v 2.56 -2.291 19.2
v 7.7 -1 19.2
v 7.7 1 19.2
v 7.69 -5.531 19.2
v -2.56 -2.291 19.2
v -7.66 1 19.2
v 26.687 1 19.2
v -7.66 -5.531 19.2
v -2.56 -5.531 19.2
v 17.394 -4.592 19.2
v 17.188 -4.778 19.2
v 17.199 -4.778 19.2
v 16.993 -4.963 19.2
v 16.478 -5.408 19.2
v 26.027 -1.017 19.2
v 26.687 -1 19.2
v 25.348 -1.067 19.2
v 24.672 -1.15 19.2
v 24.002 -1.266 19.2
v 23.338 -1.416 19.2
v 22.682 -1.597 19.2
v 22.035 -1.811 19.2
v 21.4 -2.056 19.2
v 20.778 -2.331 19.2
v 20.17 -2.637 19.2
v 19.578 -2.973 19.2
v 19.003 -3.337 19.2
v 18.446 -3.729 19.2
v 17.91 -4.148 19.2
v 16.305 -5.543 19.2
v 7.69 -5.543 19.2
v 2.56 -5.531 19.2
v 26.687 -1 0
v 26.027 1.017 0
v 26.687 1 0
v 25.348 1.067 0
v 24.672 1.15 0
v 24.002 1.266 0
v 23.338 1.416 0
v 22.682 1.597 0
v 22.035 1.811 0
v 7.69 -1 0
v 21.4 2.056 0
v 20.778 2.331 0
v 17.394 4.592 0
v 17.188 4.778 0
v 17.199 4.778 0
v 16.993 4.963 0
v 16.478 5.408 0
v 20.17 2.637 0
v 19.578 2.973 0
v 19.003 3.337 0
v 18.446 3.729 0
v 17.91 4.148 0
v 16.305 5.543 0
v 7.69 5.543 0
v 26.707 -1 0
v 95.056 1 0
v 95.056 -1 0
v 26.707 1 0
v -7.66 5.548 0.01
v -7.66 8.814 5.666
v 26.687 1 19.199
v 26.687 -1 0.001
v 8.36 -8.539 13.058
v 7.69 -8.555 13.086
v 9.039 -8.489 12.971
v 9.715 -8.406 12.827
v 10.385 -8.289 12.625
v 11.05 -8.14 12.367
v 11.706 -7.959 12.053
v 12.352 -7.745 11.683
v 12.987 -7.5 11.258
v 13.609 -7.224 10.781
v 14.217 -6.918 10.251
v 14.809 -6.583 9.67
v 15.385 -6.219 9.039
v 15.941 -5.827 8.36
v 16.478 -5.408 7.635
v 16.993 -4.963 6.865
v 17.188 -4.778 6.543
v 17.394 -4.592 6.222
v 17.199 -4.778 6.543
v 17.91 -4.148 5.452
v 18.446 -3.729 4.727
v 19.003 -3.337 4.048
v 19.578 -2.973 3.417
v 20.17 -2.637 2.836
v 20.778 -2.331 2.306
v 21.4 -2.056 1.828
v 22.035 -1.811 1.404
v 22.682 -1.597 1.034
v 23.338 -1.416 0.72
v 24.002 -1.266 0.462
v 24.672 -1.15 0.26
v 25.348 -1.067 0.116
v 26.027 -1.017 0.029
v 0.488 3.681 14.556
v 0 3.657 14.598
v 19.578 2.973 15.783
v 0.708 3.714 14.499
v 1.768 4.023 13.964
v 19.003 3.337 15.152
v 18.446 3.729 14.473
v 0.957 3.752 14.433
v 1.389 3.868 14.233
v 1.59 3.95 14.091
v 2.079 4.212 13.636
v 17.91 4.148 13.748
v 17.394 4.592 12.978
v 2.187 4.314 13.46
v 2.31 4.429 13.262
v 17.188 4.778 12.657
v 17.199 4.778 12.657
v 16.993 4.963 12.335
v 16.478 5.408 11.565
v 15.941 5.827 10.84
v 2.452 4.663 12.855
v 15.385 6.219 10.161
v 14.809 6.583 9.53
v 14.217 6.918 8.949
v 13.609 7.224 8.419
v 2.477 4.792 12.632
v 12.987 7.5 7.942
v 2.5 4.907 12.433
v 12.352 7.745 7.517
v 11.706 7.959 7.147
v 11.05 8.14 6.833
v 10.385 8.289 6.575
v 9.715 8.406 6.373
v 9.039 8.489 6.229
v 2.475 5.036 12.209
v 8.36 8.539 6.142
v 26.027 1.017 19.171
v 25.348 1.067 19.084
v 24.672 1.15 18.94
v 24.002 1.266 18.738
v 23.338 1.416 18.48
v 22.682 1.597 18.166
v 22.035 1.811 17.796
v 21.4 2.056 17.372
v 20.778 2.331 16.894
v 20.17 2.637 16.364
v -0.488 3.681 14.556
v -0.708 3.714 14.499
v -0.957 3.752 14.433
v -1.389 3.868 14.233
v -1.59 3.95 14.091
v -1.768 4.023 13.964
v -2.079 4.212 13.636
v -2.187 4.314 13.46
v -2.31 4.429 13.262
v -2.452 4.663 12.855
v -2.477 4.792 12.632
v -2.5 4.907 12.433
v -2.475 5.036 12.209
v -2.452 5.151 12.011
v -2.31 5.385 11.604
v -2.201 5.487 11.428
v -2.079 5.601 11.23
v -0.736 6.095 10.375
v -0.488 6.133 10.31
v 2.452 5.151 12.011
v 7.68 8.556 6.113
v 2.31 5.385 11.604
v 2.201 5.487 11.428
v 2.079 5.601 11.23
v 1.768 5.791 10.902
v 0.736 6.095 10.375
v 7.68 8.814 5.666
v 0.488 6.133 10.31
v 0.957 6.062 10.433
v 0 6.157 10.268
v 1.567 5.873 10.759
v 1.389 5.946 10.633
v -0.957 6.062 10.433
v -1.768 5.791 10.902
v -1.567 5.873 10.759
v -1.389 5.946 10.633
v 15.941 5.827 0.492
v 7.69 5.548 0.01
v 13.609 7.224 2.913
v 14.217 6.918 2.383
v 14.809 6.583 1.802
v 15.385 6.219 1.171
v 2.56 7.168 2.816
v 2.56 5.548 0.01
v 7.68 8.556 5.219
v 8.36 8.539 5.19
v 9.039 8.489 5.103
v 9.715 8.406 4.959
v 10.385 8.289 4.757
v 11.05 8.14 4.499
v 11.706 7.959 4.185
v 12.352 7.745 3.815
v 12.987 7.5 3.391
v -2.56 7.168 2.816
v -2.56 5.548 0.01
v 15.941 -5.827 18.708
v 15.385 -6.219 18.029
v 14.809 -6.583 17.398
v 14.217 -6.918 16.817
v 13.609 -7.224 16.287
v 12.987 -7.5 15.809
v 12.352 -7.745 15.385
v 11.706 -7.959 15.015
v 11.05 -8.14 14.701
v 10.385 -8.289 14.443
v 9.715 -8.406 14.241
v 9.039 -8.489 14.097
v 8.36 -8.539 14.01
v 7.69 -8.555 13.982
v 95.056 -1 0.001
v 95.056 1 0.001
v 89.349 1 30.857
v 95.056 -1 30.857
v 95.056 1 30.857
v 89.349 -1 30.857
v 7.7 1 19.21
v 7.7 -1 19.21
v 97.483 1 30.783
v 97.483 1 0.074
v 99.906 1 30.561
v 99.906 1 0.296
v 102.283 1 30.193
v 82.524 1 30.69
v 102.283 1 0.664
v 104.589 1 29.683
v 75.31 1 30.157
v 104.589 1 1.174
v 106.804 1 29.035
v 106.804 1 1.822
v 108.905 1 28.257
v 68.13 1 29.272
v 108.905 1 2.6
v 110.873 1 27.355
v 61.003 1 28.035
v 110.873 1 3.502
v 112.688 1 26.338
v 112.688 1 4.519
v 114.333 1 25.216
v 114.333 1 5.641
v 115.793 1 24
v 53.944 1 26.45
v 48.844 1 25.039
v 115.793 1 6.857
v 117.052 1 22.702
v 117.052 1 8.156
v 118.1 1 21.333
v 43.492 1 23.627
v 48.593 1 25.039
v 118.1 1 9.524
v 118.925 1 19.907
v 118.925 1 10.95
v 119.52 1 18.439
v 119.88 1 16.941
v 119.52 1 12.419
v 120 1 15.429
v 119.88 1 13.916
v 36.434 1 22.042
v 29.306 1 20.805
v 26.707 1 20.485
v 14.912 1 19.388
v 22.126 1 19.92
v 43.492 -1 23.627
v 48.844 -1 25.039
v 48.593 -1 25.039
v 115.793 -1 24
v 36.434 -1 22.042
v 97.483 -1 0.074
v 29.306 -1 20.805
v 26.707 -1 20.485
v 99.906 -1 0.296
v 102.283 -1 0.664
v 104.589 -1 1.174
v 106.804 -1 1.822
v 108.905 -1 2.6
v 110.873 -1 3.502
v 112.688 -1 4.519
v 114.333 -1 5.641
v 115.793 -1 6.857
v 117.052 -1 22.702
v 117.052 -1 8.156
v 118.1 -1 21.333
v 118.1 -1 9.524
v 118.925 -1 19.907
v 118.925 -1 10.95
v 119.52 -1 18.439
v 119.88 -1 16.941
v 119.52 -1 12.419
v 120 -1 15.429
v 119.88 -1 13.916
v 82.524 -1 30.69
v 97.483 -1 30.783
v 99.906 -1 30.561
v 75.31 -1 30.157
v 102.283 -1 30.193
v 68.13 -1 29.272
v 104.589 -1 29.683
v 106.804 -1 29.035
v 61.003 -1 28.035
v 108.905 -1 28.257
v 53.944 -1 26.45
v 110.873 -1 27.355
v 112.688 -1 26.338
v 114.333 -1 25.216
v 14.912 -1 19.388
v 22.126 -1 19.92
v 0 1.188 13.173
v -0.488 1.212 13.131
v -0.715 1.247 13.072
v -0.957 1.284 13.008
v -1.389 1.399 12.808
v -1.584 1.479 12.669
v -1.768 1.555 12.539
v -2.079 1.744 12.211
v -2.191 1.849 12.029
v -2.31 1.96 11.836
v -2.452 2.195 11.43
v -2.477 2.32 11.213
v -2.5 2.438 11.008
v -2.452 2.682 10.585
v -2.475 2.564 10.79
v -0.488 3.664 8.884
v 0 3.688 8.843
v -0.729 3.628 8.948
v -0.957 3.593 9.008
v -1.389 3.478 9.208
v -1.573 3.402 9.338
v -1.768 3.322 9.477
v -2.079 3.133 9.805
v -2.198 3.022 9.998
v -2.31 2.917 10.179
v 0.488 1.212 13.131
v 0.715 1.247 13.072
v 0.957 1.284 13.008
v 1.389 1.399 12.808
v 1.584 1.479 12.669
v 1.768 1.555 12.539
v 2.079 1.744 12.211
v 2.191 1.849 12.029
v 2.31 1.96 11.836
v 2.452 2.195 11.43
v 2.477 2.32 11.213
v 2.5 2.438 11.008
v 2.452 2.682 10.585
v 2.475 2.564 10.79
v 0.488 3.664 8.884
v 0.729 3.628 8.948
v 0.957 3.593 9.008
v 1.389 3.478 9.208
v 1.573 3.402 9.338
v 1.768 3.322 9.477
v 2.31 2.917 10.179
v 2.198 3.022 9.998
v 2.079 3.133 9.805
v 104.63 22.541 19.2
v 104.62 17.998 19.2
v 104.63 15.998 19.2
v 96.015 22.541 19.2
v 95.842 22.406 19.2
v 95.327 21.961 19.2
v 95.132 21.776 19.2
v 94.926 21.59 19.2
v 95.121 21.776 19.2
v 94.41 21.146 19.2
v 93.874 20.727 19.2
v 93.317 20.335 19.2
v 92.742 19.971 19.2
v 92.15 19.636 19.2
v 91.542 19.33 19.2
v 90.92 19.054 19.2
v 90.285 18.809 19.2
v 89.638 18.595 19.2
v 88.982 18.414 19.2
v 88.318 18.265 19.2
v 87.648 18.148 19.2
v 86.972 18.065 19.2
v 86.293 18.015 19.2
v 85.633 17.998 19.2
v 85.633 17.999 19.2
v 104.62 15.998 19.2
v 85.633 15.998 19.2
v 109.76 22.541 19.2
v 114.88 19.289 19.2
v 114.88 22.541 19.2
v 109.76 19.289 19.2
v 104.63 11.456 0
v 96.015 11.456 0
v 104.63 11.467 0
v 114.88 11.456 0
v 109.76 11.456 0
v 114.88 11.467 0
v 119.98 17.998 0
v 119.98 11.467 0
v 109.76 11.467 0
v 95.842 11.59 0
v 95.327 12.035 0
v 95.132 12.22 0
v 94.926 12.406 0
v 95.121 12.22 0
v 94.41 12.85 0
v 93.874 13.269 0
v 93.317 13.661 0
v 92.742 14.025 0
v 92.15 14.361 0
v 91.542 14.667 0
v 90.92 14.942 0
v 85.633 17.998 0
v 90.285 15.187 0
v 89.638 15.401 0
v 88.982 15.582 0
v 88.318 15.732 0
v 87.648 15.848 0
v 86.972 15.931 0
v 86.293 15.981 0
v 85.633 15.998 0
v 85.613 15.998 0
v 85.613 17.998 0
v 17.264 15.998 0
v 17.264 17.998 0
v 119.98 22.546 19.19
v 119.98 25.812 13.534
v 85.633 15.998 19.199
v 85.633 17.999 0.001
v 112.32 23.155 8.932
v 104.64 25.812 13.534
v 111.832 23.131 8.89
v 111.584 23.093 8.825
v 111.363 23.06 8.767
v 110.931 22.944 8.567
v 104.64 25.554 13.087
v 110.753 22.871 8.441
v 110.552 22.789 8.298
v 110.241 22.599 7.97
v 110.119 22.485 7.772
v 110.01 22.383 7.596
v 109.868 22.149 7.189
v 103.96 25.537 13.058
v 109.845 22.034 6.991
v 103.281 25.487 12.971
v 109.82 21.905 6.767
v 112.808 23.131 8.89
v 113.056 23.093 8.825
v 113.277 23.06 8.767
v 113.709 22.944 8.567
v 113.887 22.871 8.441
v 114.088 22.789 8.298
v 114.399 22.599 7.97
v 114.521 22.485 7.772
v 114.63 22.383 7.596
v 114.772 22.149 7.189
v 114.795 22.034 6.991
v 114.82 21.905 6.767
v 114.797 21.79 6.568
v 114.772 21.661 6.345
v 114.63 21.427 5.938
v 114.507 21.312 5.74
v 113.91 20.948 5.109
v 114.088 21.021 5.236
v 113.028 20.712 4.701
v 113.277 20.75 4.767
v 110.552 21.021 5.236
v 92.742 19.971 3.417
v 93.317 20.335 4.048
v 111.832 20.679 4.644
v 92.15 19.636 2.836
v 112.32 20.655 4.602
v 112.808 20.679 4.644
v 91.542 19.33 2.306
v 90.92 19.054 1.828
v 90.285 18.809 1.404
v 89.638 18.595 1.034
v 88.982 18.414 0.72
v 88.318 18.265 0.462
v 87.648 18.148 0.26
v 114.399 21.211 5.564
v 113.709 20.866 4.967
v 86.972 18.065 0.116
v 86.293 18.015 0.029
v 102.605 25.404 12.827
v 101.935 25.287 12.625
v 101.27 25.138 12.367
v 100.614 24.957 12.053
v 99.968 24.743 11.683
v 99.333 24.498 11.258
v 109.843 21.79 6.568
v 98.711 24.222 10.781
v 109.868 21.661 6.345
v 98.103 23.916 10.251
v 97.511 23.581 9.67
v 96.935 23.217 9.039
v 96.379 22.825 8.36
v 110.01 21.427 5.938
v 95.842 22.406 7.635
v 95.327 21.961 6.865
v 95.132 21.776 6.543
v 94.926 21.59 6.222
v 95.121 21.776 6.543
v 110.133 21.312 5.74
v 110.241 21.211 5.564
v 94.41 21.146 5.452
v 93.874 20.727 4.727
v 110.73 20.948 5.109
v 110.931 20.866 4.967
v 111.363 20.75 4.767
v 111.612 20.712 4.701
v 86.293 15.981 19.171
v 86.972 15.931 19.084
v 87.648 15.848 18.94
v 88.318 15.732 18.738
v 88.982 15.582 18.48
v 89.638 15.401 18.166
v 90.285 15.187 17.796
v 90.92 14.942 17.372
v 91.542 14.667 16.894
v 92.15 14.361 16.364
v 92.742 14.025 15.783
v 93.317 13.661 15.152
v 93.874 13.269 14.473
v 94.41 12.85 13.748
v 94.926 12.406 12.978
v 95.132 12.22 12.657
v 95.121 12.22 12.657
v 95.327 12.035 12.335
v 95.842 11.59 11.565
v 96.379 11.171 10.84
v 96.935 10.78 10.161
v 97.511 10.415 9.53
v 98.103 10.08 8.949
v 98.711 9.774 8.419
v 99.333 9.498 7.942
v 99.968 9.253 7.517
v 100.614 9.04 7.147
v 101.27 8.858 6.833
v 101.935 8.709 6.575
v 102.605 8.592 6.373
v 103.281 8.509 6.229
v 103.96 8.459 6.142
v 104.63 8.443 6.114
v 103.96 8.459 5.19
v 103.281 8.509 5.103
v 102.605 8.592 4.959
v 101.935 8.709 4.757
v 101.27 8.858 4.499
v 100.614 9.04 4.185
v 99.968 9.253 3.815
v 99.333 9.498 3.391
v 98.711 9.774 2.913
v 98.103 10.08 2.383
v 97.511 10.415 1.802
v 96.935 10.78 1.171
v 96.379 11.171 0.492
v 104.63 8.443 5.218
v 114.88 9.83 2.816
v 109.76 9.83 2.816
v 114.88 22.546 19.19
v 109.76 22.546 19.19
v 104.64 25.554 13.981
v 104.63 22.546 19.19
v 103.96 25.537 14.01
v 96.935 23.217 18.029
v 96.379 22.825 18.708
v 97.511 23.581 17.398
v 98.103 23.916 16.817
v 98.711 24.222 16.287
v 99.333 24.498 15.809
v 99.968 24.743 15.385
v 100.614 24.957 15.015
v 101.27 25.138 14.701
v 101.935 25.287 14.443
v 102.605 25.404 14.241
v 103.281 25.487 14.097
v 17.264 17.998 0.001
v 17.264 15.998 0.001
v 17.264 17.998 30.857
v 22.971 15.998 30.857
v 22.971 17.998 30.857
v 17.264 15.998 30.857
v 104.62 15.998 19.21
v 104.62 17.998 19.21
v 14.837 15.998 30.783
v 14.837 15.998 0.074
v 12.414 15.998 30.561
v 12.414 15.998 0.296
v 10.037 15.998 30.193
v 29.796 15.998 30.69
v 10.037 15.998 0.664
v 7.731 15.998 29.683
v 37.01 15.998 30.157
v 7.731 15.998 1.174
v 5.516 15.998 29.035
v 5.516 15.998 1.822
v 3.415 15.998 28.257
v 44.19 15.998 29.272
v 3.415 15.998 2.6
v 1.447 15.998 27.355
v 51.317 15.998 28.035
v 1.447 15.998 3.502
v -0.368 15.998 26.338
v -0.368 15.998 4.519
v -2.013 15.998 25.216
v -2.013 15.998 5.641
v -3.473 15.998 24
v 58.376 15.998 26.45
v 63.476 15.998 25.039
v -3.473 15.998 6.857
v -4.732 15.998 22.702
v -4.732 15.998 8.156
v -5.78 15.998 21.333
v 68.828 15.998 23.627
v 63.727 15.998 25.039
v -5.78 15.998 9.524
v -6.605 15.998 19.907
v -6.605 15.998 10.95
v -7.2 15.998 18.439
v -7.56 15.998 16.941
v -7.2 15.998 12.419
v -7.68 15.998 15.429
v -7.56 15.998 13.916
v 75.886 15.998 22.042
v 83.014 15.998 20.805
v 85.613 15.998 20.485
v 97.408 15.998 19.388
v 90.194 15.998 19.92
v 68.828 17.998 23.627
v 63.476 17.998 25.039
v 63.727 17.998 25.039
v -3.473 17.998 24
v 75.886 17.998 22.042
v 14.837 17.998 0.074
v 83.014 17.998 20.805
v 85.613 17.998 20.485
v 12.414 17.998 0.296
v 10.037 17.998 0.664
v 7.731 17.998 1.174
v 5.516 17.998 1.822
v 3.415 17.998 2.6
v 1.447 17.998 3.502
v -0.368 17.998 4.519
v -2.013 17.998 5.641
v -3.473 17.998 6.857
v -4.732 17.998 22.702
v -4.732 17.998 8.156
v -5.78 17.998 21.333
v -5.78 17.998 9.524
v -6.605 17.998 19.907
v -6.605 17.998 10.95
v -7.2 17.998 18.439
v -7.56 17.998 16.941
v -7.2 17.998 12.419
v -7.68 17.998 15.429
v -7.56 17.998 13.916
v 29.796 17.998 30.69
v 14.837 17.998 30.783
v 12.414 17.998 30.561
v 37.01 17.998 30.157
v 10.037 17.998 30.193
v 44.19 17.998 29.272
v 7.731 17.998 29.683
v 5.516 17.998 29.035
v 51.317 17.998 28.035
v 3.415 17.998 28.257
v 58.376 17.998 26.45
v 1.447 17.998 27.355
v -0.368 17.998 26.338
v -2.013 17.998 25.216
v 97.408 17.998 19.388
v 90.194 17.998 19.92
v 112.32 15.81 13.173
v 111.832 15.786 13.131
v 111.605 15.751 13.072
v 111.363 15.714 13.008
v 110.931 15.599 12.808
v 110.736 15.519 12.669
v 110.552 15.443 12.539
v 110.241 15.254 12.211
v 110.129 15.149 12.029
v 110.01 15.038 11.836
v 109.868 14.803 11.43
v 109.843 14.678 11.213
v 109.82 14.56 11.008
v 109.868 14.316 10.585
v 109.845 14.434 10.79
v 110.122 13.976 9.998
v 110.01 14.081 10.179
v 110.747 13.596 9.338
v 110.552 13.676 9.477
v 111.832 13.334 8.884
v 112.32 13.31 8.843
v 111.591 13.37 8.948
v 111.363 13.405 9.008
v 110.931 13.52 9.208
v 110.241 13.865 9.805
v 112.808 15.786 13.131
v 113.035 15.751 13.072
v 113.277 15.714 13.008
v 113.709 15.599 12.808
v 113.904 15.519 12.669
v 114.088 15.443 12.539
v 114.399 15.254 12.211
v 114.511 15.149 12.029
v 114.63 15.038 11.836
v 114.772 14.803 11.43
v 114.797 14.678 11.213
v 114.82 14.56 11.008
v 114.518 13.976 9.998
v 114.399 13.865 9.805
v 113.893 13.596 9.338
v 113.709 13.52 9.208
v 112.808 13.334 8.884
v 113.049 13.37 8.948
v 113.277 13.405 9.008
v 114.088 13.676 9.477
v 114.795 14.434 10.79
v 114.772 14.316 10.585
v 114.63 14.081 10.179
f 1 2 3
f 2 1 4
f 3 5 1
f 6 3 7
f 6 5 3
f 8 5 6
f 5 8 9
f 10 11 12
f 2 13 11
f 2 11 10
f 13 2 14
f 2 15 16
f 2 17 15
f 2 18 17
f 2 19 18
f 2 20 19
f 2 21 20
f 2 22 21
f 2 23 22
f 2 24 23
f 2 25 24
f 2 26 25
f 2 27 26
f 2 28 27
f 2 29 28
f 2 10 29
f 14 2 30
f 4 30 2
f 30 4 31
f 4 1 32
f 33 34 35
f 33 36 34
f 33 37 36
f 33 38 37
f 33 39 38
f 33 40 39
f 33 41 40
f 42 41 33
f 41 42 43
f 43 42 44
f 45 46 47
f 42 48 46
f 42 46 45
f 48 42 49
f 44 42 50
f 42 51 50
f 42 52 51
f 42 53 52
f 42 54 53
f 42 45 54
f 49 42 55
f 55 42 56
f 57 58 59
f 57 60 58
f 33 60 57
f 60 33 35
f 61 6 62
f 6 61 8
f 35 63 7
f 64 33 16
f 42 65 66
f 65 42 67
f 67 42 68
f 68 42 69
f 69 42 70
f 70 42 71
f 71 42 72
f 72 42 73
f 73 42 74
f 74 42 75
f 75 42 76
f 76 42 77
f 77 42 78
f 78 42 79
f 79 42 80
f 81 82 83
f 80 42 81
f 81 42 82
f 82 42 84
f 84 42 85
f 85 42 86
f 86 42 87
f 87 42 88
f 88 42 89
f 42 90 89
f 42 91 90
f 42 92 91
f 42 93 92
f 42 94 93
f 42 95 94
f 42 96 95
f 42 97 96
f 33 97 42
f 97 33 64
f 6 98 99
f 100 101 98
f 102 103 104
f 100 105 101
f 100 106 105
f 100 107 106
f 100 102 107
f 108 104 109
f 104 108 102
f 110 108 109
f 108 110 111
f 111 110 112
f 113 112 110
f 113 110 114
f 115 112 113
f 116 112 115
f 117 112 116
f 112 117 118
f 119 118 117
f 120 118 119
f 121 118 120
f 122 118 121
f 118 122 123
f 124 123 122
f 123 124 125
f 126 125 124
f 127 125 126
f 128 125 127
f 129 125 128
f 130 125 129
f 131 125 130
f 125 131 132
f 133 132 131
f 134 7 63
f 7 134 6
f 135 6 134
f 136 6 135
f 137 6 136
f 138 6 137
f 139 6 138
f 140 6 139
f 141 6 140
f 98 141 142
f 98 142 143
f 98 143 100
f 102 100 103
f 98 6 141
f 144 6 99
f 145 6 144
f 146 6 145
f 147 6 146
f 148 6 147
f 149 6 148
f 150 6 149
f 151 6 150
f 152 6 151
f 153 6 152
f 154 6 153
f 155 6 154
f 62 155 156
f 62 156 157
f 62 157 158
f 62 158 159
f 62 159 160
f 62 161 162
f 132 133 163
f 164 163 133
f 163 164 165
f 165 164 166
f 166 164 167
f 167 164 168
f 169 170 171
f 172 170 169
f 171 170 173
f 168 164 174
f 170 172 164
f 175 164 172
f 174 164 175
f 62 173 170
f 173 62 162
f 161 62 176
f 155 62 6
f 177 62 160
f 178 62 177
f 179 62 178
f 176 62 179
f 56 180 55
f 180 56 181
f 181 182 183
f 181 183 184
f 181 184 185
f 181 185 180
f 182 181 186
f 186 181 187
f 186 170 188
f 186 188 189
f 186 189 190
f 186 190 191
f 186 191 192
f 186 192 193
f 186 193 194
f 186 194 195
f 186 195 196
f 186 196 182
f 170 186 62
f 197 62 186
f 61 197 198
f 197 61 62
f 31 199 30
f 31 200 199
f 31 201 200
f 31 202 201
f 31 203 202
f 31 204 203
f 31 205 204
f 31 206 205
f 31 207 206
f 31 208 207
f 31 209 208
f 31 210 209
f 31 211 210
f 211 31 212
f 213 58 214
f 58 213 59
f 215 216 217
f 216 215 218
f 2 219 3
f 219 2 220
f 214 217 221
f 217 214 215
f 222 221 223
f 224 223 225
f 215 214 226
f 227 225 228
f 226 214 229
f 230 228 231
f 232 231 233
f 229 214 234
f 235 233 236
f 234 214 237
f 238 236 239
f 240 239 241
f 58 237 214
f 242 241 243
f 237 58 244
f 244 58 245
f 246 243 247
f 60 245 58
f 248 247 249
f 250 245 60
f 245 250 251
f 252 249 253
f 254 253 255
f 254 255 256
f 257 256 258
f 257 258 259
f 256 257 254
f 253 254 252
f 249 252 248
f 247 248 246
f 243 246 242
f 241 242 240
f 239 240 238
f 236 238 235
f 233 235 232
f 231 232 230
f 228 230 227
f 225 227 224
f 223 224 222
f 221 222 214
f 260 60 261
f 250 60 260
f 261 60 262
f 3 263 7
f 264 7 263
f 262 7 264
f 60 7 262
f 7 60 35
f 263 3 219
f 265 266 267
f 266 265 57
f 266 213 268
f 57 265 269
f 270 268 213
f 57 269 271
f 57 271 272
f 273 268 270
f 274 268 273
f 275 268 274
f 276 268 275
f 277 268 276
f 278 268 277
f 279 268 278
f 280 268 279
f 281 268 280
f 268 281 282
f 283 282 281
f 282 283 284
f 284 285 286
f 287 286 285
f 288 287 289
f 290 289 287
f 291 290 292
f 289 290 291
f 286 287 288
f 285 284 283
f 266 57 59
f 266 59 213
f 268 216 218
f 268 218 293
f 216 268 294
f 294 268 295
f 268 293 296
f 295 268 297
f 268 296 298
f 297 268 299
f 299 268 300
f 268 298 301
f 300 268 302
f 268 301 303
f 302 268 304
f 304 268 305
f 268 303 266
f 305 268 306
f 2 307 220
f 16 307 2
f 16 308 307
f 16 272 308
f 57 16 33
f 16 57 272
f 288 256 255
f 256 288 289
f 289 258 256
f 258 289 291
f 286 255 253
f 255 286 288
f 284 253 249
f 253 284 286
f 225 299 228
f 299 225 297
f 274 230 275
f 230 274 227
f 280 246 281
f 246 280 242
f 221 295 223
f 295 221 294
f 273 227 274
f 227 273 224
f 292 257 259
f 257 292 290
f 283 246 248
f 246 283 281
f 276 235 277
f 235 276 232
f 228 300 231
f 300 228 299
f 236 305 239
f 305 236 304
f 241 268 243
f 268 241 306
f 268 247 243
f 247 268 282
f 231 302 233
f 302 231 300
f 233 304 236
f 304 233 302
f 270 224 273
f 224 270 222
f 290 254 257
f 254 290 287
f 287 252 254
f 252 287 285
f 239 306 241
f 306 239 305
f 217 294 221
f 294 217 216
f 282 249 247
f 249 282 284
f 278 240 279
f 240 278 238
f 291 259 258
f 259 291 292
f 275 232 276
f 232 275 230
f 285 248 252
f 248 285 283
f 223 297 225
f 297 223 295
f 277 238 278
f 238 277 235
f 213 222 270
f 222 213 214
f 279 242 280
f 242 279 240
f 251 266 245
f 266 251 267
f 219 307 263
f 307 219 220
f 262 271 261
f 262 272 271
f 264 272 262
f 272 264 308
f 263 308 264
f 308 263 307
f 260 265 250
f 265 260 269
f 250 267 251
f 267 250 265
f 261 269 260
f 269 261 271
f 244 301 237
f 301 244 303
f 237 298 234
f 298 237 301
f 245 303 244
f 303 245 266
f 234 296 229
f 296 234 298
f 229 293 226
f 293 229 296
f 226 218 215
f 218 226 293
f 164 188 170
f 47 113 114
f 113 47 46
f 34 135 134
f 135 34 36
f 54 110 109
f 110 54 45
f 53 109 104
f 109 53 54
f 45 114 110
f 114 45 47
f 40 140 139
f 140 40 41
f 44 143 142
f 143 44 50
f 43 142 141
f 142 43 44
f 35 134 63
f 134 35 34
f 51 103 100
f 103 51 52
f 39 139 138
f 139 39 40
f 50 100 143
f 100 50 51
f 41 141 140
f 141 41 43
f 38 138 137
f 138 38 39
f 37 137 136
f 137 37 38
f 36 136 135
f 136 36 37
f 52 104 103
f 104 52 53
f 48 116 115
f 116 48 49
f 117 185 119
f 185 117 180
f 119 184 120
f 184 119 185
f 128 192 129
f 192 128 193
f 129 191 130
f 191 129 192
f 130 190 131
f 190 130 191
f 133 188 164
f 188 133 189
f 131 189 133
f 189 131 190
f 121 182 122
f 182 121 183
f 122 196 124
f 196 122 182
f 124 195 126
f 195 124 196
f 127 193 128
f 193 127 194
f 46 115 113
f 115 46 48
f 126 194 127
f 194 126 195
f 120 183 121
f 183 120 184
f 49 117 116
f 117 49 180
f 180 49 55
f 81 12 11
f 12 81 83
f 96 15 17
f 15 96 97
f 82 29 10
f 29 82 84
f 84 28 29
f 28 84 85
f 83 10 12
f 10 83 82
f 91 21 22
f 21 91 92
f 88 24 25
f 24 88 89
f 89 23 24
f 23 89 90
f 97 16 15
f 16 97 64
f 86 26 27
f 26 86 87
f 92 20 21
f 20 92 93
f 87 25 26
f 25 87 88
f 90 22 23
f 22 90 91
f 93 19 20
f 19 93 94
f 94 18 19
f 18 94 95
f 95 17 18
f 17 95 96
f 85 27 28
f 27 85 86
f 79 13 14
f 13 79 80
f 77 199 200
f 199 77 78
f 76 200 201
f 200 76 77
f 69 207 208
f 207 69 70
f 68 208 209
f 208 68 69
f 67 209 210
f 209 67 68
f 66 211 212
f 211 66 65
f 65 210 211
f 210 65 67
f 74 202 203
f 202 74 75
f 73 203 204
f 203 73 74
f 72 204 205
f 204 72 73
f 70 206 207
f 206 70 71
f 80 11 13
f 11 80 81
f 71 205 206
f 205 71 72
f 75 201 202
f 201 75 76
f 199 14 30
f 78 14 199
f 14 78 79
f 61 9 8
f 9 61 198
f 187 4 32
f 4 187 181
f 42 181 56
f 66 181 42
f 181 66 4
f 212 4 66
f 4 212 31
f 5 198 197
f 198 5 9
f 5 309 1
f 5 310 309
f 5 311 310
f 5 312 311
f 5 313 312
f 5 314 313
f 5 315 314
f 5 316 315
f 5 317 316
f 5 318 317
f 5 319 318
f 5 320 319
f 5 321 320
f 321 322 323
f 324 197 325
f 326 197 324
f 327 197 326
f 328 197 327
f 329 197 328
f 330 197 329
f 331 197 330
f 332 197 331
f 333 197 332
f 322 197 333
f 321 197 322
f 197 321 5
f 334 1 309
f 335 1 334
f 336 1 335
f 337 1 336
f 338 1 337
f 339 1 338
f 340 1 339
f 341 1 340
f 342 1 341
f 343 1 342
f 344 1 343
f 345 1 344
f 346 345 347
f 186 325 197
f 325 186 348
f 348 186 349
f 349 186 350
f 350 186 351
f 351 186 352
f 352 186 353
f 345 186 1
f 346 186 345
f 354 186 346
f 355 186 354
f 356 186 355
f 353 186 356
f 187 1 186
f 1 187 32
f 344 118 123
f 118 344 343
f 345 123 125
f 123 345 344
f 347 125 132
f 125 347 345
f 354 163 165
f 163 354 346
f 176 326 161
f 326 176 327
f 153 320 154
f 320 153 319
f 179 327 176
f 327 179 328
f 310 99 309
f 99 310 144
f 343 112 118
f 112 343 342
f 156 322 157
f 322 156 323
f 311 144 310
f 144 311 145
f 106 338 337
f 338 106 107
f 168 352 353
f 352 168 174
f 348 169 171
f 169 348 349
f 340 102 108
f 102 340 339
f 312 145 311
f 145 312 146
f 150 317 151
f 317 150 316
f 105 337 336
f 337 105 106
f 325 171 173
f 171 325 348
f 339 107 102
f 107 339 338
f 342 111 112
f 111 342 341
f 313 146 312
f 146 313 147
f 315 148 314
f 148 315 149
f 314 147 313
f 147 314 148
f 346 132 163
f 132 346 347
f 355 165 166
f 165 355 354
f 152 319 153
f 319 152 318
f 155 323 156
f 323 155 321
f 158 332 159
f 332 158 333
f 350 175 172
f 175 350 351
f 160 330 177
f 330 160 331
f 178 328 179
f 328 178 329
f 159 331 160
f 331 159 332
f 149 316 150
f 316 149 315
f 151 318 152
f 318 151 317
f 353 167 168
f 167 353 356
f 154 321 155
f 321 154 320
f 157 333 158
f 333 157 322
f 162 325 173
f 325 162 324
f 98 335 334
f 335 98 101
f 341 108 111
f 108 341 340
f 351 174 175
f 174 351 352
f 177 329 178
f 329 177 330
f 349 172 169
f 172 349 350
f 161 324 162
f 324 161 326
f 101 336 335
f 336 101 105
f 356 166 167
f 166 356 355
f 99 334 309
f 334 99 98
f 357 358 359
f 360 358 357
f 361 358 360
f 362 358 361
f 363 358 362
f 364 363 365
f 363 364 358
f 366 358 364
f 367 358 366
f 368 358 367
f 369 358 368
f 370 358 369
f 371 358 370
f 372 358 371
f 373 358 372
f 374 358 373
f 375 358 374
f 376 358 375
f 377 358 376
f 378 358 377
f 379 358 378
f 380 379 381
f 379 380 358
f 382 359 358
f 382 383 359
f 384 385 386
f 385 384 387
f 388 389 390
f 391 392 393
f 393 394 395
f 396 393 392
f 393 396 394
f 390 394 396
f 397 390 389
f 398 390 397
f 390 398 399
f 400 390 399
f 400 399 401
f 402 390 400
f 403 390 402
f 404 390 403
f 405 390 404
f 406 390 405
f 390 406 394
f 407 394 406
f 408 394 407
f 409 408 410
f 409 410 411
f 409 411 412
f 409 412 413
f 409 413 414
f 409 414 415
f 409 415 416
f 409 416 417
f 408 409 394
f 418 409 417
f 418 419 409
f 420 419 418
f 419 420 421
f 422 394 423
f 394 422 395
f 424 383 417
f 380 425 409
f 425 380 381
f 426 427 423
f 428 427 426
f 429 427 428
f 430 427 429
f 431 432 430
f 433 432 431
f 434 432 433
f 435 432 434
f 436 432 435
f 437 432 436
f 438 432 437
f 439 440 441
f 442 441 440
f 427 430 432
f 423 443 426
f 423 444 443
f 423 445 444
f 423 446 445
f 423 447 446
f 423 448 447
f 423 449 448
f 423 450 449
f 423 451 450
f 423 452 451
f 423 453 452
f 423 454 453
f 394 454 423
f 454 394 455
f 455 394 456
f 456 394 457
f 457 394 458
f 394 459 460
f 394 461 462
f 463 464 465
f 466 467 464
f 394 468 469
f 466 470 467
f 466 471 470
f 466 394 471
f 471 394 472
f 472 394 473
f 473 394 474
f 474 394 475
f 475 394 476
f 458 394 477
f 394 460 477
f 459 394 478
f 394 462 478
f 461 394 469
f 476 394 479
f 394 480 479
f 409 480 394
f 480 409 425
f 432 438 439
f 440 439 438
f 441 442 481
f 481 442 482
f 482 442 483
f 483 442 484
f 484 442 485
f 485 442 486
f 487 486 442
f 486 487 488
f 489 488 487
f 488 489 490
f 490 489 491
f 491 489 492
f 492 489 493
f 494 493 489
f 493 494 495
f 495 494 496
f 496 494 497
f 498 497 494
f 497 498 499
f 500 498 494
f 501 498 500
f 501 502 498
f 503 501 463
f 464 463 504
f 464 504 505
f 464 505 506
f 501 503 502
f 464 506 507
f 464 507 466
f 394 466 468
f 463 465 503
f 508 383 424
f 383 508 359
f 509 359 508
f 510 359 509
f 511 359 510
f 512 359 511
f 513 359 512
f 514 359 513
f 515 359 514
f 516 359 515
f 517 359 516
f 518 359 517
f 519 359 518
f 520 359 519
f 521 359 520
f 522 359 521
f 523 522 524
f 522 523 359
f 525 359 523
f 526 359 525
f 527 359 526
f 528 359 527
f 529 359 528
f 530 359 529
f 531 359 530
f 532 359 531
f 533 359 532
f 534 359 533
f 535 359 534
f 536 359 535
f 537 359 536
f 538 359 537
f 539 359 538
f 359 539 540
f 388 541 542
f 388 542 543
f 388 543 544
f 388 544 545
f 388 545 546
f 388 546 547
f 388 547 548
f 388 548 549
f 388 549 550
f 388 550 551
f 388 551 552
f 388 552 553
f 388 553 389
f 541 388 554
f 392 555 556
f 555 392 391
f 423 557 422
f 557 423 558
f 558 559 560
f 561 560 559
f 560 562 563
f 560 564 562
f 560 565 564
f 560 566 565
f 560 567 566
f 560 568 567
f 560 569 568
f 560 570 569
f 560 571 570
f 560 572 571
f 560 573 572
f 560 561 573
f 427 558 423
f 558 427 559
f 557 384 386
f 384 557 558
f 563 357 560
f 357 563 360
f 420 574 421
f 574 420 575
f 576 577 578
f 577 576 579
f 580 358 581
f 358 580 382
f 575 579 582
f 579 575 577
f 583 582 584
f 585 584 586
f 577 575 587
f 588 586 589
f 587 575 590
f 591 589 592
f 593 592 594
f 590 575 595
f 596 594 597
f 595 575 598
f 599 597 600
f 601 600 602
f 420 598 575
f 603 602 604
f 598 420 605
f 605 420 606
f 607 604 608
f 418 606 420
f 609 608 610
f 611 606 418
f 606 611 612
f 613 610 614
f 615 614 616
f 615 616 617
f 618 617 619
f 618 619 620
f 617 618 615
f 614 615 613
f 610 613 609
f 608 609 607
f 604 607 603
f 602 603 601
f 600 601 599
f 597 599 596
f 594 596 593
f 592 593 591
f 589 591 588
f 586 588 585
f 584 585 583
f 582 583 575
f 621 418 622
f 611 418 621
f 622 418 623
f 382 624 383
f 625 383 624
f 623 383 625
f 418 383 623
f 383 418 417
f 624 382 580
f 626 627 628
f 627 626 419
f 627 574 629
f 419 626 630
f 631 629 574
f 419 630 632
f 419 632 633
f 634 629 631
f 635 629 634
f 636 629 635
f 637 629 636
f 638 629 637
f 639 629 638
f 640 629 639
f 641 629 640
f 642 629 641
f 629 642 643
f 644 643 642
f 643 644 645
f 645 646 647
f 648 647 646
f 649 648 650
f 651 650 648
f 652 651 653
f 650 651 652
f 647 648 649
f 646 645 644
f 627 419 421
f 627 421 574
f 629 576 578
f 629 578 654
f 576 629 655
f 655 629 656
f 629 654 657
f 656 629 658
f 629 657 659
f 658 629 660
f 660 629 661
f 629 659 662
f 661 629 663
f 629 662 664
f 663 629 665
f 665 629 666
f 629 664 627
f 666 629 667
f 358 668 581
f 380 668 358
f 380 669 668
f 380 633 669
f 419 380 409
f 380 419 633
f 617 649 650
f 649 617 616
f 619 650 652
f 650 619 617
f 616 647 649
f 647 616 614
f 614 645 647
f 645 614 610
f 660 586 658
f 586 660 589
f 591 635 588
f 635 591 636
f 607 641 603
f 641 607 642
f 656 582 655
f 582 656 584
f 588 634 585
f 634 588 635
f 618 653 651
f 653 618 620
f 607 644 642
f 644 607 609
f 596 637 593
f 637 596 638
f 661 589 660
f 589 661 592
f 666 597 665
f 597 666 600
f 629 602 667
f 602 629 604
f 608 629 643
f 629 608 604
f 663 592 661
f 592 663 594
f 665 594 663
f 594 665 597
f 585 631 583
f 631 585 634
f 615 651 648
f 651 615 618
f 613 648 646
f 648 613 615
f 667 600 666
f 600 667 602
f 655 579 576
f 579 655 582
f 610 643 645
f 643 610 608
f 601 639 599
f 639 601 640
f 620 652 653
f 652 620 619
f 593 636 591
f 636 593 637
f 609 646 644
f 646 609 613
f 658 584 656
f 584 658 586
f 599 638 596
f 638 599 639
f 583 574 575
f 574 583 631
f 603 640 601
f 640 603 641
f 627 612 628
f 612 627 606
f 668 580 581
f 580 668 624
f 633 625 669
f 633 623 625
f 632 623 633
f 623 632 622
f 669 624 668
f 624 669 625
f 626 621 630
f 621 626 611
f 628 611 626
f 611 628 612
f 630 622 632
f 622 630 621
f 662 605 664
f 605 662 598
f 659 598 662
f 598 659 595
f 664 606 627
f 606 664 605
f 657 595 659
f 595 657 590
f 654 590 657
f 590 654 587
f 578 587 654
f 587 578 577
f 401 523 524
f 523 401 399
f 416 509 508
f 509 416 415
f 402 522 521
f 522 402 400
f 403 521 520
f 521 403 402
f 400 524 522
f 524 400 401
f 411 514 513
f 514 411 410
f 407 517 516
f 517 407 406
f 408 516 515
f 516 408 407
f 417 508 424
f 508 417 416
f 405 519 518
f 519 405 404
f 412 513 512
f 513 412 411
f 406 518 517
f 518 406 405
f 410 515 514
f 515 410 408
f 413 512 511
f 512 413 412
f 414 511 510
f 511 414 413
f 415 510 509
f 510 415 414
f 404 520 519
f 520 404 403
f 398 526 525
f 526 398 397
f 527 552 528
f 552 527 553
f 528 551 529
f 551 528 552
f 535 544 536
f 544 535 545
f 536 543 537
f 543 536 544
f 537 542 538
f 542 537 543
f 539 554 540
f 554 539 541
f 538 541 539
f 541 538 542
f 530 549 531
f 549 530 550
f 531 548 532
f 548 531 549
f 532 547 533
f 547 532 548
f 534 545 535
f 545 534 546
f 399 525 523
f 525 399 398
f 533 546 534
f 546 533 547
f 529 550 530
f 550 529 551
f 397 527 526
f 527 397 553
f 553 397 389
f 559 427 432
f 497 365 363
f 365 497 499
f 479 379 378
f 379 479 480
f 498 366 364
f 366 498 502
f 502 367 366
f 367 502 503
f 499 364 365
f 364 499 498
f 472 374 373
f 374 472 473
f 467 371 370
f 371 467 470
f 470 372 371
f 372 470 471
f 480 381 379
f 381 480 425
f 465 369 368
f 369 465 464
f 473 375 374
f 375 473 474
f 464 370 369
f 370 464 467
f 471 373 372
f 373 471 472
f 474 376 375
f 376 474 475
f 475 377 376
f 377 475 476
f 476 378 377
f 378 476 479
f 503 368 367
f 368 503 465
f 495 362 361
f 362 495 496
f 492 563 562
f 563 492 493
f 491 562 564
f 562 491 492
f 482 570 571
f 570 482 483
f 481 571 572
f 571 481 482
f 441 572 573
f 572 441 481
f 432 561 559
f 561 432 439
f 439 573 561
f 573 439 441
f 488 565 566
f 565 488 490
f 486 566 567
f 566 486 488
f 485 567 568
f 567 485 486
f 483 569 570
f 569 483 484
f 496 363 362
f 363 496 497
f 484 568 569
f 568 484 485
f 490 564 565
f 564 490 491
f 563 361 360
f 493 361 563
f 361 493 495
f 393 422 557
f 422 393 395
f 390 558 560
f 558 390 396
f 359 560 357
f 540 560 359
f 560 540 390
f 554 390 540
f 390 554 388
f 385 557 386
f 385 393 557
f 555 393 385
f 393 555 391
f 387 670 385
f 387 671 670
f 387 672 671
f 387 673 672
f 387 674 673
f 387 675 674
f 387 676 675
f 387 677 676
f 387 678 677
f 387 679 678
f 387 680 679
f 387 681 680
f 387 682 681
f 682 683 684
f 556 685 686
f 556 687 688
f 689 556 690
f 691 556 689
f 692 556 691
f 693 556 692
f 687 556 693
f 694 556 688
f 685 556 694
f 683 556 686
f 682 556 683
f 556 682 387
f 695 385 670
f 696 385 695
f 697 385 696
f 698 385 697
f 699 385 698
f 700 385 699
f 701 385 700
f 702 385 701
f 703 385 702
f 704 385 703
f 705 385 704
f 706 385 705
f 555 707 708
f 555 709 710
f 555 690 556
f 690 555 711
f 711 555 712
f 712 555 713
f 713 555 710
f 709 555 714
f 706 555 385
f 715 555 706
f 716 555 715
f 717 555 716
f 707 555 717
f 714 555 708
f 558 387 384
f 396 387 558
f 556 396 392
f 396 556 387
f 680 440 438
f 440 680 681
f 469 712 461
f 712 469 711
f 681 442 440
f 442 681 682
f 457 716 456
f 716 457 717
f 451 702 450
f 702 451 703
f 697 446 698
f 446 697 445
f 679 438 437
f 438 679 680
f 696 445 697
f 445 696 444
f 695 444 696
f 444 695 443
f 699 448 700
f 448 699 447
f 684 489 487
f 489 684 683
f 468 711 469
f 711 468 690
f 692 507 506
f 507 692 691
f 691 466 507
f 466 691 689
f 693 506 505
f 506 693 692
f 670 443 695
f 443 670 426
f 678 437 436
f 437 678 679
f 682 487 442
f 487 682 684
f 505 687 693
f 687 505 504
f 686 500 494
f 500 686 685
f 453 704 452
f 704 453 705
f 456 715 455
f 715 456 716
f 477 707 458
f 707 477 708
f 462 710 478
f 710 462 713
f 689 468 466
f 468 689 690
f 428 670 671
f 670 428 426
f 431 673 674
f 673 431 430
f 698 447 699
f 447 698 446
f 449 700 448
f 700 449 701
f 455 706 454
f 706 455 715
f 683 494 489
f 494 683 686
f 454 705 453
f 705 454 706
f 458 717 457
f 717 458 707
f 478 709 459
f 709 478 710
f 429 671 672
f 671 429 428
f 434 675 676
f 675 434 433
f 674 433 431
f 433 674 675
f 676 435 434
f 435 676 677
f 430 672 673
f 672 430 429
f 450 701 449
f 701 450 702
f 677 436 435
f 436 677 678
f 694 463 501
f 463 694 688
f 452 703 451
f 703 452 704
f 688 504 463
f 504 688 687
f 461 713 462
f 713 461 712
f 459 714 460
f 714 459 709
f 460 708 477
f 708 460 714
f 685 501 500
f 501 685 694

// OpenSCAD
/*
 *  Fully Parameterized Two Blade Propeller/Windwheel
 *  Copyright (C) 2011 Lukas Süss
 *  lukas.suess at gmx.at
 *
 *  This program is free software; you can redistribute it and/or modify
 *  it under the terms of the GNU General Public License as published by
 *  the Free Software Foundation; either version 3 of the License, or
 *  (at your option) any later version.
 *
 *  This program is distributed in the hope that it will be useful,
 *  but WITHOUT ANY WARRANTY; without even the implied warranty of
 *  MERCHANTABILITY or FITNESS FOR A PARTICULAR PURPOSE.  See the
 *  GNU General Public License for more details.
 *
 *  You should have received a copy of the GNU General Public License
 *  along with this program; if not, write to the Free Software
 *  Foundation, Inc., 59 Temple Place, Suite 330, Boston, MA  02111-1307  USA
 *
 */

/*
This is a simple parameterized "Two Blade Propeller/Windwheel"

It is optimized for supportless printing (blades printet vertically)
and designd out of two parts so that
even on small buildspace printers pretty big propellers can be made
Examples:
(cupcake: 10x10x13 cm^3) => max 20cm propeller (28cm diagonal)
(ultimaker: 21x21x21 cm3) => max 42cm propeller (59cm diagonal)

The "wheel" might work for water too, 
just choose a higher bladeangle
and make it shorter & wider

Use F6 to build this!
There's an option to activate fast F5 preview but this  
comes at the expense of not/wrongly showing some geometry


feel free to modify!!
some ideas how to improve & extend the design are appendet at the very bottom of this file 

*/





bladeangle = 30; // measured from the "mounting plane"

bore = 5; // hole diameter (not scaled with propeller length)
tblade = 2; // thickness of the rotor blades (not scaled with propeller length)


//tipElipticallity = 0.61803; // more beautiful but more overhang
tipElipticallity = 1; //no effect?!


length = 2      *120.0; //length of the final Propeller (buildspace*2) :) (default=98)
wmax = length/7  *0.9; // maximal width of the blade (too big => bug visible) (default=1.0)
wmin = length/10 *0.8; // width of mounting block (in blade orientation!)
// (wmin > wmax) suprisingly does not lead to a total mess (but it shouldnt be used)

lmount = wmin    *0.8; // length of the mounting block  (x-axis)


// AUTOgenerated: 
// (change only if you know what you are doing)
  l = length - 2*(wmax/2)/tipElipticallity;  // length to the point of maximal width of the blade
  teffmount = (wmin*tan(bladeangle)+tblade)*cos(bladeangle); // mounting block thickness in mounting direction
// END Autogenerated


//tipElipticallity = 1; 
tipElipticallity = 0.61803; // more beautiful but more overhang

//mountsmooth = 0;// l*0.15; // SET IN THE onlyF6 IF somehow (code to clean)
mountsmooth = l*0.1;// l*0.15; 


// resolution related
onlyF6 = true; // set false for fast but incorrect preview
vert = 32; // small cylinder resolution
vert2 = 64; // big cylinder resolution
eps = 0.02; // zero would be best but leads to image artefacts (just keep it)





//OUTPUT!!:
printconfig1();   // outputs file for stl-export & print
//combinedview(); // how the final propeller looks


// END OF ADJUSTING AREA  
// lookout for #############'s below








// TEST VISUALISATIONS:
//halfrotor(true);
//halfrotor(false);
// translate([0,-3*tblade,0]) cbc(length,5,5); // lengthcheck


module printconfig1()
{
  halfrotor(true);
  translate([length/2-lmount/2,1.5*teffmount,0])
  rotate(180,[0,0,1]) halfrotor(false);
}
module combinedview()
{
  rotate(-bladeangle,[1,0,0])  
  halfrotor(true);
  
  translate([0,0,wmin*cos(bladeangle)])
  rotate(180+bladeangle,[1,0,0]) 
  rotate(180,[0,0,1]) halfrotor(false);
}


// THIS IS THE MAIN PART OF THE CODE
module halfrotor(gender)
{
//rotate(-bladeangle,[1,0,0]) // to get the picture (deactivate for print)
{
difference()
{
  union()
  {
    // Blade
    translate([lmount/2+eps,-tblade/2,0])
    cube([ (l-lmount)/2,tblade,wmax ]);
    
    // Tips
    translate([l/2,0,wmax/2])
    rotate(90,[1,0,0]) scale([1/tipElipticallity,1,1])
    cylinder(r=wmax/2,h=tblade,center=true,$fn=vert2);
    // to avoid overhang replace the half ellypse wit a quater ellypse here #########


    // TODO smear out to the sides (+2*blockround)
    intersection() // mounting block POS
    {
      translate([1/2*mountsmooth+eps,0,wmin/2]) 
        cbc(lmount+1*mountsmooth,l,wmin);
      translate([0,0,wmin/2]) rotate(bladeangle,[1,0,0])
        cbc(lmount+2*mountsmooth,teffmount,l);

     // symmetric edge breaking alternative
     translate([1/2*mountsmooth+eps,0,wmin/2])
     rotate(2*bladeangle-90,[1,0,0]) 
       cbc(lmount+1*mountsmooth,wmin,l/2); // edge breaking
    }
  }

   // main blade curvature ##### **see ideas
   translate([lmount/2,0,wmin+0.01])
   rotate(90,[1,0,0])
   S_cutter((l-lmount/2)*0.45,wmax-wmin,2*vert2); // why is 0.5 100% ??
  

  //bore
  translate([0,0,wmin/2])
  rotate(90+bladeangle,[1,0,0])
  //  ############################## add ballbearing-"groove" here
  {
    cylinder(r=bore/2,h=l,$fn=vert,center=true);
    // how thick is the blde here
  }
  


  // main blade curvature
  if(onlyF6==true)
  {
    thinningblade();
    mirror([0,1,0]) thinningblade();
  }

  if (gender) { femalecut(); }
  if (! gender) { malecut(); } 

}
}
}//end module







module cbc(x,y,z)  //convenience
{  cube([x,y,z],center=true); }

module thinningblade()
{
  // TODO: other side
  translate([mountsmooth+lmount/2+eps,tblade/2,0])
  mirror([-1,0,0])
  S_cutter(mountsmooth+eps,(teffmount*1.51-tblade)/2,2*vert2); // << to simplify ######
  // 1.51 is just randon (should be calculated exactly!) =>
  // the thinnings don't reach inward to the mountblock or "overreach" it! (minor BUG) #######
}


module femalecut()
{
  union() //mount block cutter male
  {
    translate([0,-(teffmount/2)/cos(bladeangle),0]) // SwS
    translate([0,0,wmin/2])
    rotate(bladeangle,[1,0,0])
      cbc(lmount+eps,teffmount+eps,3*wmin); 
  
  
    translate([0,+(teffmount/8)/cos(bladeangle)-eps,0]) // SwS
    translate([0,0,wmin/2])
    rotate(bladeangle,[1,0,0])
      cbc(lmount/3,teffmount/4,3*wmin); //rille
  }
}
module malecut() // DANGER creats overhangs
{
  difference() //mount block cutter female
  {
    translate([0,+(teffmount/2)/cos(bladeangle),0]) // SwS
    translate([0,0,wmin/2])
    rotate(bladeangle,[1,0,0])
      cbc(lmount+eps,teffmount+eps,3*wmin); //mount block cutter
  
  
    translate([0,+(teffmount/8)/cos(bladeangle)-eps,0]) // SwS
    translate([0,0,wmin/2])
    rotate(bladeangle,[1,0,0])
      cbc(lmount/3,teffmount/4,3*wmin); //rille
  }
}
// SwS ... swap sign to swap sides of male and female part
// but don't do it! 
// reason: the male blade might have mid air overhangs if (bore > width of the groove)




// S-shape starting horizontally in xyplane into the 1st quadrant (upperhalf filled)
module S_cutter(dx,dy,resol) 
{
  // in and out is horizontal; that makes the curve unambiguous
  d = 80;
  rr = 1/4*(dy +dx*dx/dy); // Derivation: sqrt((rr-dy/2)^2+(dx/2)^2)=rr 
  //echo(rr);

  intersection()
  {
    difference()
    {
      union()
      {
        translate([0,dy/2,-d/2+d*0.05]) cube([dx,2*rr,d*0.9]); // cutter BODY
        
        translate([0,rr,0])  // PLUS cylinder
       cylinder(r=rr,h=d,$fn=resol,center=true);
      }

      translate([dx,dy-rr,0]) // MINUS
      cylinder(r=rr,h=d,$fn=resol,center=true);
      }
      translate([2*rr,2*rr,0]) cube([4*rr,4*rr,d],center=true);
    }
}







/*
some ideas for improvement:


> add grooves for ball bearings

> desigh a fitting weather vane
> design a fitting mount

> COOL: add butten-cell powerd laserpointers to get a free lasershow at squally new moon nights

> generalize to 3 or more blades (4 noncoplanar should be easy)

> alter the blade shapes to something less classic but more fancy

> mount (suitable!) whistles to the tips (so your child wont be overheard when cycling)
>   dont forget the (slidable?) muting plug


> combine some of the above


what I might add:
> TODO: ** change the z shaping so that the blade isnt always smallest at the end of the mountng block
>   and tickest just at the tip roundingdelayd s start
TODO:
change propellertipshape?
make the bore more acessible for potential modifiers!!




or you might wanna go crazy and do something like this:

> right now its just a toy but you could:
>> modify the blade to a more aerodynamic teardropshape
>> twist the blade
>> make a coupling for a dynamo

>>> remove the typical OpenSCAD little edgedness 
>>> due to openscads fillet hardness

> make the bladeangle physically adjustable


# print a lot of them all with different random parameters in reasonable margins
#   and mount them on a crazy "wind sculpture"



> determine optimal bladethickness for printing and denote it here
> or more general: optimize parameters for a good print

*/
